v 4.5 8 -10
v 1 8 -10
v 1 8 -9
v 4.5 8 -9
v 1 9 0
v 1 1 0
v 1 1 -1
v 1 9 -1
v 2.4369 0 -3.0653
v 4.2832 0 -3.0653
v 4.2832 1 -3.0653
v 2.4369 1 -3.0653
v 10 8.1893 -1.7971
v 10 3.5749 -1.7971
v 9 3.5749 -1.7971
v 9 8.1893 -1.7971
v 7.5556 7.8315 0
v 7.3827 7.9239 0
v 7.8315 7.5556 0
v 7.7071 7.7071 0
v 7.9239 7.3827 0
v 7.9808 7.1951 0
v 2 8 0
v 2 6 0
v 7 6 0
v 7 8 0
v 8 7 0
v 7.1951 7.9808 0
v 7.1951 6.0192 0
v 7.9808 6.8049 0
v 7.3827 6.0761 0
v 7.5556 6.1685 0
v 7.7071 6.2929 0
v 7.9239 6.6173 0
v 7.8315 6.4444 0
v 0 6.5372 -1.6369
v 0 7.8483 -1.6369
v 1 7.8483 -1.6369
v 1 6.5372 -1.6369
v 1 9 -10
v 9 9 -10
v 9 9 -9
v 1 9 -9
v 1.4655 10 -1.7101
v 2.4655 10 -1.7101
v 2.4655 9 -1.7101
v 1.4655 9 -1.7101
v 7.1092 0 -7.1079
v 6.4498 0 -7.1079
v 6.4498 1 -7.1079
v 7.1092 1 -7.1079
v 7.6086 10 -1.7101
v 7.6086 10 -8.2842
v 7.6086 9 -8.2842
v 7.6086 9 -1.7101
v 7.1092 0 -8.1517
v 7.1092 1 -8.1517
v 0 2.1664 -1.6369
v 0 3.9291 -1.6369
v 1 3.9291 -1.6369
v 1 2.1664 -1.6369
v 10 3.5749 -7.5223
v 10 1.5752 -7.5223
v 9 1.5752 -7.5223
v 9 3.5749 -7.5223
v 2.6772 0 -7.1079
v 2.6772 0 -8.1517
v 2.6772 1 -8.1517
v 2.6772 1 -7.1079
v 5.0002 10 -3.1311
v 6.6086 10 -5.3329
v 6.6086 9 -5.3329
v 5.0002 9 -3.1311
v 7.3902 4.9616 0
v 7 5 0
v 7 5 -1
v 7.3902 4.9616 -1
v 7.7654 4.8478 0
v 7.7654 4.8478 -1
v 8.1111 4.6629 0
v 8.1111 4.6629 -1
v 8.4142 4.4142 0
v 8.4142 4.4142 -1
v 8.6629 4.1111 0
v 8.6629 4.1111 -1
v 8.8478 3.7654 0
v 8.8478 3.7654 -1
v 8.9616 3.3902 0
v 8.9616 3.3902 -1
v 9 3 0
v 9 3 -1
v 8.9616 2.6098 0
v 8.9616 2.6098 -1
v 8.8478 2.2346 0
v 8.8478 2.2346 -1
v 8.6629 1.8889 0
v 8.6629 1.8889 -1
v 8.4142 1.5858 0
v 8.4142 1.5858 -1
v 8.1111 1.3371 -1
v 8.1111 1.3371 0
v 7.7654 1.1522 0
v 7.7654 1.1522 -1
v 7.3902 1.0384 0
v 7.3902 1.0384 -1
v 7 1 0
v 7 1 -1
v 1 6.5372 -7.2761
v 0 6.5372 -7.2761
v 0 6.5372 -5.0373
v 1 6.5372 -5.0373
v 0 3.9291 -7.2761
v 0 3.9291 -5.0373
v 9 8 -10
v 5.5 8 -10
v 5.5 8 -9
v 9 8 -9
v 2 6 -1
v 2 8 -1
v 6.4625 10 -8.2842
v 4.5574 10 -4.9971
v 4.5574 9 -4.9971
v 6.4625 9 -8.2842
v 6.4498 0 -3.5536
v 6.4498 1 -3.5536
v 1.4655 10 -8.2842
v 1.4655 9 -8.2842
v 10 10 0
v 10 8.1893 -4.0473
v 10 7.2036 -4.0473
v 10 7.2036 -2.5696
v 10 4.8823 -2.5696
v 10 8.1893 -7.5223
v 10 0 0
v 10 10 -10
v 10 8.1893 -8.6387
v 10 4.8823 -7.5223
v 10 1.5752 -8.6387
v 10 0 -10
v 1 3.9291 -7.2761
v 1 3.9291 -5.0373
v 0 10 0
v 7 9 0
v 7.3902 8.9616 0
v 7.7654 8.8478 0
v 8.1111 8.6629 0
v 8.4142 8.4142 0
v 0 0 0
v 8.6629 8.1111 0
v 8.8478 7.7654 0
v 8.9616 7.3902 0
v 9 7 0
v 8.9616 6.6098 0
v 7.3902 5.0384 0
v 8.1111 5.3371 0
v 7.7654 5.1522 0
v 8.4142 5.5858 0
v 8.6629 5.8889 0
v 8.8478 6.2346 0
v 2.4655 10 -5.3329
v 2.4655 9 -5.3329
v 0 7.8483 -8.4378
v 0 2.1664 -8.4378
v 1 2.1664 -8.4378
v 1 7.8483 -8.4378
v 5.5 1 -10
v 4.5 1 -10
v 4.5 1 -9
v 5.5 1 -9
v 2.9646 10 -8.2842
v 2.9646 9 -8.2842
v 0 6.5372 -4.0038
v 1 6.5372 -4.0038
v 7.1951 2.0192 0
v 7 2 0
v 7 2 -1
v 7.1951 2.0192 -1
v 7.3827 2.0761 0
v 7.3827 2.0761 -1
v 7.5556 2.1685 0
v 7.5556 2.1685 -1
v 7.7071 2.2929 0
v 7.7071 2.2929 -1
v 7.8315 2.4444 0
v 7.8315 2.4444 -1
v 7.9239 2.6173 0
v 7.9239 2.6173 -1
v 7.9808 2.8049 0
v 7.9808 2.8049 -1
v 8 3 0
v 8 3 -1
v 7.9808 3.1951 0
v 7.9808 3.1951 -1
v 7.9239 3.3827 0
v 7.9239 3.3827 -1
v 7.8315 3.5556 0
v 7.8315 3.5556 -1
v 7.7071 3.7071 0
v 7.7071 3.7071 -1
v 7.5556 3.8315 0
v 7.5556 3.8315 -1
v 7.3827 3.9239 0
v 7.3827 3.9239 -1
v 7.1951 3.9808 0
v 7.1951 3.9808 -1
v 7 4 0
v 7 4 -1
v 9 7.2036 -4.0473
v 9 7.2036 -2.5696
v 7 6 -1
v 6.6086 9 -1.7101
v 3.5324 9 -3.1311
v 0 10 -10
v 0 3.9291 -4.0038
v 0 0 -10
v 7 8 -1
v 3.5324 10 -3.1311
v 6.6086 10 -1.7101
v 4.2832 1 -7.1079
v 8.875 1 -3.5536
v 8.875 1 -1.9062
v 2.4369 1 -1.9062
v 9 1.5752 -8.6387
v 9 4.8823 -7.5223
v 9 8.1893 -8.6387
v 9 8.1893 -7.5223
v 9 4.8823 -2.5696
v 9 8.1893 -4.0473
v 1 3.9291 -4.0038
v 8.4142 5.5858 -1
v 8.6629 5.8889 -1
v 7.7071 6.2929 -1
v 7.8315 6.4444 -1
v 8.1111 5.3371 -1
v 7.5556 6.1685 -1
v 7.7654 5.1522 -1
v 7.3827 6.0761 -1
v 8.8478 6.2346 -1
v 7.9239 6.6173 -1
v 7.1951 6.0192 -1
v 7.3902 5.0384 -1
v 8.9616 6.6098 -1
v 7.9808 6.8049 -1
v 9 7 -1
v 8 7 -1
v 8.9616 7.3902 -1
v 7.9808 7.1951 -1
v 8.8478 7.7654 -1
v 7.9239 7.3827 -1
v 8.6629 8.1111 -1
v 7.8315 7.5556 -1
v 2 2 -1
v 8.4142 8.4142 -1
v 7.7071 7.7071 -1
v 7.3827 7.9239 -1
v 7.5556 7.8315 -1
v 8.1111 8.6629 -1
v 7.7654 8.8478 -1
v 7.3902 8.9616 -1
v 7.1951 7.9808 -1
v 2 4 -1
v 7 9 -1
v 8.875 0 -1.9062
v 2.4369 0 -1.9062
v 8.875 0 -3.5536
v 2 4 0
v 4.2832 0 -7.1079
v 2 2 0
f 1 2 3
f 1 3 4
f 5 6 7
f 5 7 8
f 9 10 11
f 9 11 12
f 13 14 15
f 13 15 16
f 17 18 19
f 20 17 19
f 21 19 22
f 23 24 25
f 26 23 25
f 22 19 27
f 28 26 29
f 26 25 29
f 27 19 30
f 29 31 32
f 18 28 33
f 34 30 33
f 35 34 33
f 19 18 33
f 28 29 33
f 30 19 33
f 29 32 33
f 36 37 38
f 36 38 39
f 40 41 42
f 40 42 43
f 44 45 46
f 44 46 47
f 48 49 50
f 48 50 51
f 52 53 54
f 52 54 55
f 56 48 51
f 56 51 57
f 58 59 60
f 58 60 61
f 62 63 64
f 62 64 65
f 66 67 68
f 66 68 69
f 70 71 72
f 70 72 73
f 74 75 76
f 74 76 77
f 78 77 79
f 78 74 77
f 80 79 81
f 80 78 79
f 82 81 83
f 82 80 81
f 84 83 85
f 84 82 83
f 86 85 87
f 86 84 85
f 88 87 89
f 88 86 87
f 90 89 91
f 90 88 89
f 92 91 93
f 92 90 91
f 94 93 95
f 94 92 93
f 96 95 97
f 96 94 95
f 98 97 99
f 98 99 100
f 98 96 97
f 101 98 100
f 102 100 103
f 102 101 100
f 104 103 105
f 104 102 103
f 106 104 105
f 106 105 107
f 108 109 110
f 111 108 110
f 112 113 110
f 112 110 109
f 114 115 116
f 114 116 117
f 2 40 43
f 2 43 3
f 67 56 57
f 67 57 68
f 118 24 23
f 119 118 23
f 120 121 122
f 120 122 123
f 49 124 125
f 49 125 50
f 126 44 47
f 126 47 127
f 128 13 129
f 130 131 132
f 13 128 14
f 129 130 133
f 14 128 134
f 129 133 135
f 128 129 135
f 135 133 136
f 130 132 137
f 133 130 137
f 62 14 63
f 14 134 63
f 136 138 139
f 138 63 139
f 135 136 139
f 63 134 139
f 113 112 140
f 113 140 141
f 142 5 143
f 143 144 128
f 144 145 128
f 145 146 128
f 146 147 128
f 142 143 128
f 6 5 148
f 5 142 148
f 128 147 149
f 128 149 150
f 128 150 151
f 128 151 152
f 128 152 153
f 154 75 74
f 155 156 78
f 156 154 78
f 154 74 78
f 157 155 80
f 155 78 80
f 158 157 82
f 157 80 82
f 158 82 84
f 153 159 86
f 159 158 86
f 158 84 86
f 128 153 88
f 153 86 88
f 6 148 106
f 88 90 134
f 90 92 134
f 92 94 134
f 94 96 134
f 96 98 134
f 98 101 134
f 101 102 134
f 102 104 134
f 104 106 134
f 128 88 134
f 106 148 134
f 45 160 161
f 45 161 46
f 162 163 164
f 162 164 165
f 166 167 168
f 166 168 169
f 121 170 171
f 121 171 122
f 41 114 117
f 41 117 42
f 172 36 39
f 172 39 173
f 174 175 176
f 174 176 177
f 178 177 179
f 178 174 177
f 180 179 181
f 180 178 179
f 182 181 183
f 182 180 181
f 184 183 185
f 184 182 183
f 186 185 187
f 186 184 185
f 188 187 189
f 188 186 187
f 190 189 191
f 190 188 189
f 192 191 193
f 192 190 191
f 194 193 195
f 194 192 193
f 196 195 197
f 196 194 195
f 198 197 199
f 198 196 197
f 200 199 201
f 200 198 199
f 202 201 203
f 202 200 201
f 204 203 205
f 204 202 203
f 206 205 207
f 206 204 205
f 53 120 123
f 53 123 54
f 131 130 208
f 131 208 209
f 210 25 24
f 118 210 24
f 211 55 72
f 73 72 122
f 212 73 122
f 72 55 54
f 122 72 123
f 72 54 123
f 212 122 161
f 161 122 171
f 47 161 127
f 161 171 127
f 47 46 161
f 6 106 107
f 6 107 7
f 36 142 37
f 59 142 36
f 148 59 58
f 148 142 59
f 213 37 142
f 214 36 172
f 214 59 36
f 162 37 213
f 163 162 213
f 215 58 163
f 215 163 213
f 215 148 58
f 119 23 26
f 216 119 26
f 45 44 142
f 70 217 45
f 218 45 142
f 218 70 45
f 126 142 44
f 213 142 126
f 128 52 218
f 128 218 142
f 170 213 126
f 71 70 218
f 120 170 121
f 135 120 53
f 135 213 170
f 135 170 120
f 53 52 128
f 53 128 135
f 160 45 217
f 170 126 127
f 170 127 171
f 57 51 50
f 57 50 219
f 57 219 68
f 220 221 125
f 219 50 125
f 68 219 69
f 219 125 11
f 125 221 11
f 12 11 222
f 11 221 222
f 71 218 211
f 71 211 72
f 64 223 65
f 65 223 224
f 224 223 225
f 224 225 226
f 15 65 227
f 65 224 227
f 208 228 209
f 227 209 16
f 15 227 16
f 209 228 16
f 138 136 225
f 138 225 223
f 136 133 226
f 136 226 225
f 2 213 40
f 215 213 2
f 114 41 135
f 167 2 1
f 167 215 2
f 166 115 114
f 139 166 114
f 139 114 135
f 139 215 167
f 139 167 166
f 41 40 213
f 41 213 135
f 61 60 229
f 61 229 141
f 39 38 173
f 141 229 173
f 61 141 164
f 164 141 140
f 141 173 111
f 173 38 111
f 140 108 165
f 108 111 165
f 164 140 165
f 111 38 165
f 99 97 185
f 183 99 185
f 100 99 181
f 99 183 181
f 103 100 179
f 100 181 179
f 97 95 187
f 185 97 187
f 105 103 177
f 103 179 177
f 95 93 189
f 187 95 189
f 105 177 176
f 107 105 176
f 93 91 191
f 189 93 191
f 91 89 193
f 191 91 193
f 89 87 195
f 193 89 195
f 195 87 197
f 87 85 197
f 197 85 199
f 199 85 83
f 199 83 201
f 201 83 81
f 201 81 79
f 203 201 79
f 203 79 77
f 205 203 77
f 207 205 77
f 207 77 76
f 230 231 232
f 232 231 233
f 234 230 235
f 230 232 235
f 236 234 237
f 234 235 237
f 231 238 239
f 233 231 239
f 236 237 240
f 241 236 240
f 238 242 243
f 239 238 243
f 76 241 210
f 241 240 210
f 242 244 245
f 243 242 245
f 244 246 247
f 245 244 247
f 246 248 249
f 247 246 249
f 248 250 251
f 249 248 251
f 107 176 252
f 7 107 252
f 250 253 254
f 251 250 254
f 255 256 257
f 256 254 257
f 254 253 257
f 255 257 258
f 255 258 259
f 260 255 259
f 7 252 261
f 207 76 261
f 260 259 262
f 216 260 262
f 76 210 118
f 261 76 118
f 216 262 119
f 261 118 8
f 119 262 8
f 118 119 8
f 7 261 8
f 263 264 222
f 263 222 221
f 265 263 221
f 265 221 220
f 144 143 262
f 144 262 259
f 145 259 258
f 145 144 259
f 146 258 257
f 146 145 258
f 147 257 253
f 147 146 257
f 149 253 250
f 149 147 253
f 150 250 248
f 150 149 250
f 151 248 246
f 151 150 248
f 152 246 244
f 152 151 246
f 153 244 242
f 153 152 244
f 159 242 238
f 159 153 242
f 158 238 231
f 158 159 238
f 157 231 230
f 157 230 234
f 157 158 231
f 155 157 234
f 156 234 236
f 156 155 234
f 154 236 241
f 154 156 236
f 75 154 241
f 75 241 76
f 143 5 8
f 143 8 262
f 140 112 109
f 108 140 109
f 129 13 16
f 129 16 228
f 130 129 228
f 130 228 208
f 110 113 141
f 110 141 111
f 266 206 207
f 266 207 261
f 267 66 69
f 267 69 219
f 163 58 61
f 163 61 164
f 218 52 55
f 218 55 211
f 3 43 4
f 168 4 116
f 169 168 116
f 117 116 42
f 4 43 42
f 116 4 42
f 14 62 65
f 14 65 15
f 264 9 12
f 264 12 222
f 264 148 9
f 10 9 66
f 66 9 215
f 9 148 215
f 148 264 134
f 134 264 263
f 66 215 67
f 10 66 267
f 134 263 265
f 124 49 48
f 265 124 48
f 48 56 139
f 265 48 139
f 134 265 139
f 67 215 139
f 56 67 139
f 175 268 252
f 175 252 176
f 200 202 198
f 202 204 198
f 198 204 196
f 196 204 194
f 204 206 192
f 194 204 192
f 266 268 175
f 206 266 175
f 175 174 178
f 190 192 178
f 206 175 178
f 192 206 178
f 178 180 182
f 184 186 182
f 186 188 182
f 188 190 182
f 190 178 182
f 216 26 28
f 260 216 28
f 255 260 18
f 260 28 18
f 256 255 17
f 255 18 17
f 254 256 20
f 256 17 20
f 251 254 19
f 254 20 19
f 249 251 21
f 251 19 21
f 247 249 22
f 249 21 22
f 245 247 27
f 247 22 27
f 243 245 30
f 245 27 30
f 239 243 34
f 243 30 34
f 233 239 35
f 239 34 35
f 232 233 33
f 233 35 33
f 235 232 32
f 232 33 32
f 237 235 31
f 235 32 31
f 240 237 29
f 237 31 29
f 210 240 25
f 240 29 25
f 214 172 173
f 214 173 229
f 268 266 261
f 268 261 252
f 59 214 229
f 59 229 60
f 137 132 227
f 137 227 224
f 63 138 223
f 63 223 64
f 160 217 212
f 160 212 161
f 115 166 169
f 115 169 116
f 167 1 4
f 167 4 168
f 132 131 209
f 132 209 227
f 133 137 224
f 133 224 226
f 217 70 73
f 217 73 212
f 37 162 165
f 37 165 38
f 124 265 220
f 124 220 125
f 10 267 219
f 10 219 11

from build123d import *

# Parameters (mm, degrees)
SKETCH1_W           = 10
SKETCH1_H           = 10
BOSS_EXTRUDE1_DEPTH = 10
CUT_EXTRUDE1_DEPTH  = 1
CUT_EXTRUDE2_DEPTH  = 1
CUT_EXTRUDE3_DEPTH  = 1
SKETCH5_W           = 2.238729714
SKETCH5_H           = 2.608108567
CUT_EXTRUDE4_DEPTH  = 1
CUT_EXTRUDE5_DEPTH  = 1
CUT_EXTRUDE6_DEPTH  = 1


with BuildPart() as part:
    # Sketch1 → Boss-Extrude1 (new body)
    with BuildSketch(Plane(origin=(0, 0, 0), x_dir=(1, 0, 0), z_dir=(0, 1, 0))):
        with Locations((5, 5)):
            Rectangle(SKETCH1_W, SKETCH1_H)
    extrude(amount=BOSS_EXTRUDE1_DEPTH)

    # Sketch2 → Cut-Extrude1 (cut)
    with BuildSketch(Plane(origin=(0, 10, 0), x_dir=(1, 0, 0), z_dir=(0, 1, 0))):
        Polygon((1.465466964, 1.710070359), (1.465466964, 8.284227428), (2.964562162, 8.284227428), (4.557350811, 4.997148894), (6.462450959, 8.284227428), (7.608638796, 8.284227428), (7.608638796, 1.710070359), (6.608638796, 1.710070359), (6.608638796, 5.332883756), (5.000234573, 3.131087683), (3.532370524, 3.131087683), (2.465466964, 5.332883756), (2.465466964, 1.710070359), align=None)
    extrude(amount=-CUT_EXTRUDE1_DEPTH, mode=Mode.SUBTRACT)

    # Sketch3 → Cut-Extrude2 (cut)
    with BuildSketch(Plane(origin=(10, 0, 0), x_dir=(0, 0, -1), z_dir=(1, 0, 0))):
        Polygon((8.63868002, 8.189348455), (8.63868002, 1.575196843), (7.522328424, 1.575196843), (7.522328424, 3.574876892), (1.797107491, 3.574876892), (1.797107491, 8.189348455), (4.047324941, 8.189348455), (4.047324941, 7.203608146), (2.569618508, 7.203608146), (2.569618508, 4.882272649), (7.522328424, 4.882272649), (7.522328424, 8.189348455), align=None)
    extrude(amount=-CUT_EXTRUDE2_DEPTH, mode=Mode.SUBTRACT)

    # Sketch4 → Cut-Extrude3 (cut)
    with BuildSketch(Plane.XZ):
        Polygon((7.109235008, -8.151746998), (2.677244084, -8.151746998), (2.677244084, -7.107897794), (4.283200213, -7.107897794), (4.283200213, -3.06528113), (2.436930969, -3.06528113), (2.436930969, -1.906165647), (8.875026218, -1.906165647), (8.875026218, -3.55360609), (6.449771082, -3.55360609), (6.449771082, -7.107897794), (7.109235008, -7.107897794), align=None)
    extrude(amount=-CUT_EXTRUDE3_DEPTH, mode=Mode.SUBTRACT)

    # Sketch5 → Cut-Extrude4 (cut)
    with BuildSketch(Plane.ZY):
        Polygon((-1.636879665, 2.166406858), (-8.437777795, 2.166406858), (-8.437777795, 7.84825918), (-1.636879665, 7.84825918), (-1.636879665, 6.537193973), (-4.003754487, 6.537193973), (-4.003754487, 3.929085406), (-1.636879665, 3.929085406), align=None)
        with Locations((-6.156693587, 5.23313969)):
            Rectangle(SKETCH5_W, SKETCH5_H, mode=Mode.SUBTRACT)
    extrude(amount=-CUT_EXTRUDE4_DEPTH, mode=Mode.SUBTRACT)

    # Sketch6 → Cut-Extrude5 (cut)
    with BuildSketch(Plane(origin=(0, 0, -10), x_dir=(-1, 0, 0), z_dir=(0, 0, -1))):
        Polygon((-9, 9), (-1, 9), (-1, 8), (-4.5, 8), (-4.5, 1), (-5.5, 1), (-5.5, 8), (-9, 8), align=None)
    extrude(amount=-CUT_EXTRUDE5_DEPTH, mode=Mode.SUBTRACT)

    # Sketch7 → Cut-Extrude6 (cut)
    with BuildSketch(Plane.XY):
        with BuildLine():
            ThreePointArc((7, 5), (9, 3), (7, 1))
            Line((7, 1), (1, 1))
            Line((1, 1), (1, 9))
            Line((1, 9), (7, 9))
            ThreePointArc((7, 9), (9, 7), (7, 5))
        make_face()
        with BuildLine():
            Line((2, 8), (7, 8))
            ThreePointArc((7, 8), (8, 7), (7, 6))
            Line((7, 6), (2, 6))
            Line((2, 6), (2, 8))
        make_face(mode=Mode.SUBTRACT)
        with BuildLine():
            Line((7, 4), (2, 4))
            Line((2, 4), (2, 2))
            Line((2, 2), (7, 2))
            ThreePointArc((7, 2), (8, 3), (7, 4))
        make_face(mode=Mode.SUBTRACT)
    extrude(amount=-CUT_EXTRUDE6_DEPTH, mode=Mode.SUBTRACT)


solid = part.part
